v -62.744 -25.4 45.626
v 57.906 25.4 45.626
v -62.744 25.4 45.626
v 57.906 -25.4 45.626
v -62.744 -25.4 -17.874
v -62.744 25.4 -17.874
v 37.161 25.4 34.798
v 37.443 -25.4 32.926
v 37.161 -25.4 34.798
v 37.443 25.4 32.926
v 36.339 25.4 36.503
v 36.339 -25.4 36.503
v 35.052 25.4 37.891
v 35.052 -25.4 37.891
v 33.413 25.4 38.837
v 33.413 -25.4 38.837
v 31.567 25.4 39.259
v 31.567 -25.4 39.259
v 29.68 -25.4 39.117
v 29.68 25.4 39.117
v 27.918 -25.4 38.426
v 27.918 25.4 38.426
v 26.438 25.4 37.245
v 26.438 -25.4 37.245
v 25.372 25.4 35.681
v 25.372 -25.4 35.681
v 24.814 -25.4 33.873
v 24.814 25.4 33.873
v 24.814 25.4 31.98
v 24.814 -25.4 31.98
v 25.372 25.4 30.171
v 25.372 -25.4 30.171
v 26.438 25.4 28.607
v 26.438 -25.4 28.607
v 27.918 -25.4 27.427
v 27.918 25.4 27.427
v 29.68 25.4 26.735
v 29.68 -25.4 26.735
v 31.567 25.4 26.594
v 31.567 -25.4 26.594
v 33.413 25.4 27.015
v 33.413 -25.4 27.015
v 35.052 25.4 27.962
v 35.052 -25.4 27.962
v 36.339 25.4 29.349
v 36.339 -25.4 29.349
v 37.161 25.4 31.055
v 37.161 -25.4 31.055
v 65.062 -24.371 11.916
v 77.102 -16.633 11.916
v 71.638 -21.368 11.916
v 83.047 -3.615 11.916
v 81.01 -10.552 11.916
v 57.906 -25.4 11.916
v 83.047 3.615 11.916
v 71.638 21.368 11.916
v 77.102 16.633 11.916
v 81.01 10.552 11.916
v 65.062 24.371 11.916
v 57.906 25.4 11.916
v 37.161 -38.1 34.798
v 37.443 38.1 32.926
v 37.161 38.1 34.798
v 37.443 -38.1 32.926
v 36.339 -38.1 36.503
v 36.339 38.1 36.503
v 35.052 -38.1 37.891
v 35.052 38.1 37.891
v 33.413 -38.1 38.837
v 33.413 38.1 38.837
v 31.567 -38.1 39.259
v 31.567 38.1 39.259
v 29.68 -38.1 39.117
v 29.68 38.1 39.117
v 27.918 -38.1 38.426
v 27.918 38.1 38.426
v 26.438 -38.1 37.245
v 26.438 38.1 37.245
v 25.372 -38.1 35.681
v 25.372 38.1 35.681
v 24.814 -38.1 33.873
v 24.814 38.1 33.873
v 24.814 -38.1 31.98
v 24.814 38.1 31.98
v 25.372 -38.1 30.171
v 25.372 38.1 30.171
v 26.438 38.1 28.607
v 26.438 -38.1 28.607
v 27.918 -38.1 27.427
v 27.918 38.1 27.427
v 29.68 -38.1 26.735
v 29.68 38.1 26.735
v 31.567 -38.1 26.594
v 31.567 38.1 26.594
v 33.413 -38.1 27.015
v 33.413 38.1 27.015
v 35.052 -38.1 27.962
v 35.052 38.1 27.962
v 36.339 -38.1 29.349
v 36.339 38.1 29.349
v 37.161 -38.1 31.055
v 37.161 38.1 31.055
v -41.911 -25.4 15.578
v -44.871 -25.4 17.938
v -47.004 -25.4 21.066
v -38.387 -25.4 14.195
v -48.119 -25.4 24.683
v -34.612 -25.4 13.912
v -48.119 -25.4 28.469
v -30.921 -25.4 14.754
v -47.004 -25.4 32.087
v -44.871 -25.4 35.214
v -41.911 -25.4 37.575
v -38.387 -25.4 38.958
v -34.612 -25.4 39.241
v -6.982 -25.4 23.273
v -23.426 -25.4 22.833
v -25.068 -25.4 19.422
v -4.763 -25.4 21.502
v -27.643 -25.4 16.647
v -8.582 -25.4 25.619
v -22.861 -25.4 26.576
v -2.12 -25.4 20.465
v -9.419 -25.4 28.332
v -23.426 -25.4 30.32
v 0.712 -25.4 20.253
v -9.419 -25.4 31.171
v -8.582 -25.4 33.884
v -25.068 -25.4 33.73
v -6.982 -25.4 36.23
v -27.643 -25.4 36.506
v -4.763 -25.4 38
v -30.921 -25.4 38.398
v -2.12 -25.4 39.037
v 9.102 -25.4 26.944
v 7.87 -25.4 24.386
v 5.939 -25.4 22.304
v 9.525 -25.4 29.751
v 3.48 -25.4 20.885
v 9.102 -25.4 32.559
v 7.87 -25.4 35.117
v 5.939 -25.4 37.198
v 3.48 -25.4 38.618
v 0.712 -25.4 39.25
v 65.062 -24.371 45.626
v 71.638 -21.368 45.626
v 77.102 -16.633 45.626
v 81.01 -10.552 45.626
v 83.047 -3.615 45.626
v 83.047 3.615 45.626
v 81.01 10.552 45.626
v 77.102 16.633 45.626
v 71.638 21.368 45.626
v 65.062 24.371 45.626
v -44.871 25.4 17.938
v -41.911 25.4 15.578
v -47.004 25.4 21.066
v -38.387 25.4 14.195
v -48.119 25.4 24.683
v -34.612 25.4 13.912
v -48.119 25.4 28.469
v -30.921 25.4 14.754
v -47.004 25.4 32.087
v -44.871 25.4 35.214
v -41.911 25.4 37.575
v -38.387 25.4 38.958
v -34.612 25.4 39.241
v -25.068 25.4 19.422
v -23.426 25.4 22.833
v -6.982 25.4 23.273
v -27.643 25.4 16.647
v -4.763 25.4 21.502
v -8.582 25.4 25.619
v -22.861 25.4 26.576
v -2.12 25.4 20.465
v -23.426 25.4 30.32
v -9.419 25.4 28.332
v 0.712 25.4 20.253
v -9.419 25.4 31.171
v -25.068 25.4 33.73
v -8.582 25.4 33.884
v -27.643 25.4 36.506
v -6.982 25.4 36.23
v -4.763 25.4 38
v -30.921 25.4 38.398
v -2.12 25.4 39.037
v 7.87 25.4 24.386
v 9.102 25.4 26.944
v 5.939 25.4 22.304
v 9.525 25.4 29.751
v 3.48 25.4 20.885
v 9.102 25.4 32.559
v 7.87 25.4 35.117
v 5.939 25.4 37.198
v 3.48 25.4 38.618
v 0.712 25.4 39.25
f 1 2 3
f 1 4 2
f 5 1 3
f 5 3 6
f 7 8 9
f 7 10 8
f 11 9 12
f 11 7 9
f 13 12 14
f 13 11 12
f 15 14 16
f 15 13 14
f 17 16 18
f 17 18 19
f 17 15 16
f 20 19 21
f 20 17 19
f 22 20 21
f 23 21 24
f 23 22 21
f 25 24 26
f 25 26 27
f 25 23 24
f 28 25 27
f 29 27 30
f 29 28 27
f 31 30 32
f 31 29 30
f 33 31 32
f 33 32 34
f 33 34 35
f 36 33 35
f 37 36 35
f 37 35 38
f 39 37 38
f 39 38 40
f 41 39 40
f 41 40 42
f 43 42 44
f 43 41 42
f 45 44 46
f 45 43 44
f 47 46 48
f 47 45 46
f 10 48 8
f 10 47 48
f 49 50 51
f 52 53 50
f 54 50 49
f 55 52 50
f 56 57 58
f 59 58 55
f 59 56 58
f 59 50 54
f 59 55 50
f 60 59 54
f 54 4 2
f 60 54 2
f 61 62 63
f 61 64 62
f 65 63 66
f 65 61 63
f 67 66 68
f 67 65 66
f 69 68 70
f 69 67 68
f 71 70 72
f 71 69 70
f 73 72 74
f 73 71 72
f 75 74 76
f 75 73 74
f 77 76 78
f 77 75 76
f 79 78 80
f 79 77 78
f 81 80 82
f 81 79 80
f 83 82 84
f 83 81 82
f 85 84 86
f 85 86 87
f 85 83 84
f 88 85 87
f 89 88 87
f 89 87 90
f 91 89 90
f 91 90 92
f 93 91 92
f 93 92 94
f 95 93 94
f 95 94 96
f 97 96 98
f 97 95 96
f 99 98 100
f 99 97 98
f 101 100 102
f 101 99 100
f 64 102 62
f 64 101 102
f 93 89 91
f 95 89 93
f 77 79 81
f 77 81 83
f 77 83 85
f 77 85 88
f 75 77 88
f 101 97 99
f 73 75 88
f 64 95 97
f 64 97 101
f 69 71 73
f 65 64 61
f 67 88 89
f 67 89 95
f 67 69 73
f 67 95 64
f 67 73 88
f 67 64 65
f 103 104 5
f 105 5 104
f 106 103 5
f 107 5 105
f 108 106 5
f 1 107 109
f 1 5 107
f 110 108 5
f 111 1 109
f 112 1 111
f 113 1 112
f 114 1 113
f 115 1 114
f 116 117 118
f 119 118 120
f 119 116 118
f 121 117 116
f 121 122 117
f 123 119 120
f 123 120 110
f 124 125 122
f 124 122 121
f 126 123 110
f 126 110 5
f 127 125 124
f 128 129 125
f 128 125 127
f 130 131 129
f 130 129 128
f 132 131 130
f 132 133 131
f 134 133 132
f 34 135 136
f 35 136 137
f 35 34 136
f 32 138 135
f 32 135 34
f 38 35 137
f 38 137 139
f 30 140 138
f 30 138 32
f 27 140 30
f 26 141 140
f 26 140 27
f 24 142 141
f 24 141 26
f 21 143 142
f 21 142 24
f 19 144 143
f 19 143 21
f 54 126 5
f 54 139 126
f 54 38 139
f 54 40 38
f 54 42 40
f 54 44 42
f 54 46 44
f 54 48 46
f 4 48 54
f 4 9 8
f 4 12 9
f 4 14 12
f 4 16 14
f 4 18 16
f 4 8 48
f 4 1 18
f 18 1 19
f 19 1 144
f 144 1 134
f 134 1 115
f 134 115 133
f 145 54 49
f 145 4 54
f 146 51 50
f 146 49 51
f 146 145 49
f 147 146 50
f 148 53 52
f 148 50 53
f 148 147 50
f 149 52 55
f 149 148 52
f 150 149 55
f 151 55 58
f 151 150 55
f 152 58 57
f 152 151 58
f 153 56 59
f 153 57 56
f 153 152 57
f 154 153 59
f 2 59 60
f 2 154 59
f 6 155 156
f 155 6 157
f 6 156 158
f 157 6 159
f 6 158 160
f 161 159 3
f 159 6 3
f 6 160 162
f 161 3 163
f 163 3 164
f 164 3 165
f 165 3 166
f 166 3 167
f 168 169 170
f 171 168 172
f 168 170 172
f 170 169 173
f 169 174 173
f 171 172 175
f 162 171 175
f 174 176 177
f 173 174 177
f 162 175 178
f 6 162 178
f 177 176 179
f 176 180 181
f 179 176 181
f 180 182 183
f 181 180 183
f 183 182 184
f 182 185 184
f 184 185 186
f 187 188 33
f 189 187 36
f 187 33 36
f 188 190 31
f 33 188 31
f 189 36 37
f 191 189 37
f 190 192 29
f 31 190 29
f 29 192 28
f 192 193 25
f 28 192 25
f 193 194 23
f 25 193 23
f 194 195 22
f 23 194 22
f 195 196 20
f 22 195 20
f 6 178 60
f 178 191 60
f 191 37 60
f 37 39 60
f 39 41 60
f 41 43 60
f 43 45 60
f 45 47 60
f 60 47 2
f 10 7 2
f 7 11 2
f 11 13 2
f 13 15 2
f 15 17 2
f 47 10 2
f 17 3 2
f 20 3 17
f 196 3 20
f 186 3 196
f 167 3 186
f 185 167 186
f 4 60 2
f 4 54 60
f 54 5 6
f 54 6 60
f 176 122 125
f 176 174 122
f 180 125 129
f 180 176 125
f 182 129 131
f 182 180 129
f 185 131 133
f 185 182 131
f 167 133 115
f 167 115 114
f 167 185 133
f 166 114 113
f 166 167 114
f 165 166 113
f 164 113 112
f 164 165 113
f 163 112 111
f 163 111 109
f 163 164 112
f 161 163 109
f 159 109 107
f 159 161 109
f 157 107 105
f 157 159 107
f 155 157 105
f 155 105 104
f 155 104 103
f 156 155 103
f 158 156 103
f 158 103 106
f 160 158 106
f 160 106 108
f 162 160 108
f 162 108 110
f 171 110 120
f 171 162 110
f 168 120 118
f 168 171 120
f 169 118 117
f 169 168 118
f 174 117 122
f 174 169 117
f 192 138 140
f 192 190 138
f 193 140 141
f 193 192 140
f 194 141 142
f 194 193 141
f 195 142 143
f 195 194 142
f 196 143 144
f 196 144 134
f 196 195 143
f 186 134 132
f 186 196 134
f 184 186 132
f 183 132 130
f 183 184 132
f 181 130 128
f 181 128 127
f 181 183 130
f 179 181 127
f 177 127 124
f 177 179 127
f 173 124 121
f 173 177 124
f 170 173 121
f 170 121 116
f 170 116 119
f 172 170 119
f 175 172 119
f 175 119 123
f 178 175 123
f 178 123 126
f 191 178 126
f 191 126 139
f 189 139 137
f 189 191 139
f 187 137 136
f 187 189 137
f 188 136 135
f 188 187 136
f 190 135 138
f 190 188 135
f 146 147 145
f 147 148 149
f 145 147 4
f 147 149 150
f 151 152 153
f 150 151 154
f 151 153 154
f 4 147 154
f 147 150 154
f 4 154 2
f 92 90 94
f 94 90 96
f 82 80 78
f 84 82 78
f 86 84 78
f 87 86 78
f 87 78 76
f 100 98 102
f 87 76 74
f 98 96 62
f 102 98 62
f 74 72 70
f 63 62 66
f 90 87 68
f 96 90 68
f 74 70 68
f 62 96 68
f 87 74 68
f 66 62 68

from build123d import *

# Parameters (mm, degrees)
F0_R     = 12.7
F0_R_2   = 9.525
F0_R_3   = 6.35
F1_DEPTH = 25.4
F2_R     = 6.35
F3_DEPTH = 38.1
F0_W     = 25.4
F0_H     = 33.710446
F4_ANGLE = 180


with BuildPart() as f1:
    # F0 (on Front) → F1 (new body, symmetric)
    with BuildSketch(Plane.XZ):
        Polygon((57.905746, 45.626265), (-62.744254, 45.626265), (-62.744254, -17.873735), (57.905746, 11.915819), align=None)
        with Locations((-35.561286, 26.576265)):
            Circle(F0_R, mode=Mode.SUBTRACT)
        with Locations((0, 29.751265)):
            Circle(F0_R_2, mode=Mode.SUBTRACT)
        with Locations((31.092848, 32.926265)):
            Circle(F0_R_3, mode=Mode.SUBTRACT)
    extrude(amount=F1_DEPTH, both=True)


with BuildPart() as f3:
    # F2 (on Front) → F3 (new body, symmetric)
    with BuildSketch(Plane.XZ):
        with Locations((31.092846, 32.926265)):
            Circle(F2_R)
    extrude(amount=F3_DEPTH, both=True)


with BuildPart() as f4:
    # F0 (on Front) → F4 (revolve, symmetric)
    with BuildSketch(Plane.XZ) as f4_sk:
        with Locations((70.605746, 28.771042)):
            Rectangle(F0_W, F0_H)
    revolve(axis=Axis((57.905746, 0, 28.771042), (0, 0, -1)), revolution_arc=F4_ANGLE / 2)
    revolve(f4_sk.sketch, axis=Axis((57.905746, 0, 28.771042), (0, 0, 1)), revolution_arc=F4_ANGLE / 2)


solid = Compound([f1.part, f3.part, f4.part])
